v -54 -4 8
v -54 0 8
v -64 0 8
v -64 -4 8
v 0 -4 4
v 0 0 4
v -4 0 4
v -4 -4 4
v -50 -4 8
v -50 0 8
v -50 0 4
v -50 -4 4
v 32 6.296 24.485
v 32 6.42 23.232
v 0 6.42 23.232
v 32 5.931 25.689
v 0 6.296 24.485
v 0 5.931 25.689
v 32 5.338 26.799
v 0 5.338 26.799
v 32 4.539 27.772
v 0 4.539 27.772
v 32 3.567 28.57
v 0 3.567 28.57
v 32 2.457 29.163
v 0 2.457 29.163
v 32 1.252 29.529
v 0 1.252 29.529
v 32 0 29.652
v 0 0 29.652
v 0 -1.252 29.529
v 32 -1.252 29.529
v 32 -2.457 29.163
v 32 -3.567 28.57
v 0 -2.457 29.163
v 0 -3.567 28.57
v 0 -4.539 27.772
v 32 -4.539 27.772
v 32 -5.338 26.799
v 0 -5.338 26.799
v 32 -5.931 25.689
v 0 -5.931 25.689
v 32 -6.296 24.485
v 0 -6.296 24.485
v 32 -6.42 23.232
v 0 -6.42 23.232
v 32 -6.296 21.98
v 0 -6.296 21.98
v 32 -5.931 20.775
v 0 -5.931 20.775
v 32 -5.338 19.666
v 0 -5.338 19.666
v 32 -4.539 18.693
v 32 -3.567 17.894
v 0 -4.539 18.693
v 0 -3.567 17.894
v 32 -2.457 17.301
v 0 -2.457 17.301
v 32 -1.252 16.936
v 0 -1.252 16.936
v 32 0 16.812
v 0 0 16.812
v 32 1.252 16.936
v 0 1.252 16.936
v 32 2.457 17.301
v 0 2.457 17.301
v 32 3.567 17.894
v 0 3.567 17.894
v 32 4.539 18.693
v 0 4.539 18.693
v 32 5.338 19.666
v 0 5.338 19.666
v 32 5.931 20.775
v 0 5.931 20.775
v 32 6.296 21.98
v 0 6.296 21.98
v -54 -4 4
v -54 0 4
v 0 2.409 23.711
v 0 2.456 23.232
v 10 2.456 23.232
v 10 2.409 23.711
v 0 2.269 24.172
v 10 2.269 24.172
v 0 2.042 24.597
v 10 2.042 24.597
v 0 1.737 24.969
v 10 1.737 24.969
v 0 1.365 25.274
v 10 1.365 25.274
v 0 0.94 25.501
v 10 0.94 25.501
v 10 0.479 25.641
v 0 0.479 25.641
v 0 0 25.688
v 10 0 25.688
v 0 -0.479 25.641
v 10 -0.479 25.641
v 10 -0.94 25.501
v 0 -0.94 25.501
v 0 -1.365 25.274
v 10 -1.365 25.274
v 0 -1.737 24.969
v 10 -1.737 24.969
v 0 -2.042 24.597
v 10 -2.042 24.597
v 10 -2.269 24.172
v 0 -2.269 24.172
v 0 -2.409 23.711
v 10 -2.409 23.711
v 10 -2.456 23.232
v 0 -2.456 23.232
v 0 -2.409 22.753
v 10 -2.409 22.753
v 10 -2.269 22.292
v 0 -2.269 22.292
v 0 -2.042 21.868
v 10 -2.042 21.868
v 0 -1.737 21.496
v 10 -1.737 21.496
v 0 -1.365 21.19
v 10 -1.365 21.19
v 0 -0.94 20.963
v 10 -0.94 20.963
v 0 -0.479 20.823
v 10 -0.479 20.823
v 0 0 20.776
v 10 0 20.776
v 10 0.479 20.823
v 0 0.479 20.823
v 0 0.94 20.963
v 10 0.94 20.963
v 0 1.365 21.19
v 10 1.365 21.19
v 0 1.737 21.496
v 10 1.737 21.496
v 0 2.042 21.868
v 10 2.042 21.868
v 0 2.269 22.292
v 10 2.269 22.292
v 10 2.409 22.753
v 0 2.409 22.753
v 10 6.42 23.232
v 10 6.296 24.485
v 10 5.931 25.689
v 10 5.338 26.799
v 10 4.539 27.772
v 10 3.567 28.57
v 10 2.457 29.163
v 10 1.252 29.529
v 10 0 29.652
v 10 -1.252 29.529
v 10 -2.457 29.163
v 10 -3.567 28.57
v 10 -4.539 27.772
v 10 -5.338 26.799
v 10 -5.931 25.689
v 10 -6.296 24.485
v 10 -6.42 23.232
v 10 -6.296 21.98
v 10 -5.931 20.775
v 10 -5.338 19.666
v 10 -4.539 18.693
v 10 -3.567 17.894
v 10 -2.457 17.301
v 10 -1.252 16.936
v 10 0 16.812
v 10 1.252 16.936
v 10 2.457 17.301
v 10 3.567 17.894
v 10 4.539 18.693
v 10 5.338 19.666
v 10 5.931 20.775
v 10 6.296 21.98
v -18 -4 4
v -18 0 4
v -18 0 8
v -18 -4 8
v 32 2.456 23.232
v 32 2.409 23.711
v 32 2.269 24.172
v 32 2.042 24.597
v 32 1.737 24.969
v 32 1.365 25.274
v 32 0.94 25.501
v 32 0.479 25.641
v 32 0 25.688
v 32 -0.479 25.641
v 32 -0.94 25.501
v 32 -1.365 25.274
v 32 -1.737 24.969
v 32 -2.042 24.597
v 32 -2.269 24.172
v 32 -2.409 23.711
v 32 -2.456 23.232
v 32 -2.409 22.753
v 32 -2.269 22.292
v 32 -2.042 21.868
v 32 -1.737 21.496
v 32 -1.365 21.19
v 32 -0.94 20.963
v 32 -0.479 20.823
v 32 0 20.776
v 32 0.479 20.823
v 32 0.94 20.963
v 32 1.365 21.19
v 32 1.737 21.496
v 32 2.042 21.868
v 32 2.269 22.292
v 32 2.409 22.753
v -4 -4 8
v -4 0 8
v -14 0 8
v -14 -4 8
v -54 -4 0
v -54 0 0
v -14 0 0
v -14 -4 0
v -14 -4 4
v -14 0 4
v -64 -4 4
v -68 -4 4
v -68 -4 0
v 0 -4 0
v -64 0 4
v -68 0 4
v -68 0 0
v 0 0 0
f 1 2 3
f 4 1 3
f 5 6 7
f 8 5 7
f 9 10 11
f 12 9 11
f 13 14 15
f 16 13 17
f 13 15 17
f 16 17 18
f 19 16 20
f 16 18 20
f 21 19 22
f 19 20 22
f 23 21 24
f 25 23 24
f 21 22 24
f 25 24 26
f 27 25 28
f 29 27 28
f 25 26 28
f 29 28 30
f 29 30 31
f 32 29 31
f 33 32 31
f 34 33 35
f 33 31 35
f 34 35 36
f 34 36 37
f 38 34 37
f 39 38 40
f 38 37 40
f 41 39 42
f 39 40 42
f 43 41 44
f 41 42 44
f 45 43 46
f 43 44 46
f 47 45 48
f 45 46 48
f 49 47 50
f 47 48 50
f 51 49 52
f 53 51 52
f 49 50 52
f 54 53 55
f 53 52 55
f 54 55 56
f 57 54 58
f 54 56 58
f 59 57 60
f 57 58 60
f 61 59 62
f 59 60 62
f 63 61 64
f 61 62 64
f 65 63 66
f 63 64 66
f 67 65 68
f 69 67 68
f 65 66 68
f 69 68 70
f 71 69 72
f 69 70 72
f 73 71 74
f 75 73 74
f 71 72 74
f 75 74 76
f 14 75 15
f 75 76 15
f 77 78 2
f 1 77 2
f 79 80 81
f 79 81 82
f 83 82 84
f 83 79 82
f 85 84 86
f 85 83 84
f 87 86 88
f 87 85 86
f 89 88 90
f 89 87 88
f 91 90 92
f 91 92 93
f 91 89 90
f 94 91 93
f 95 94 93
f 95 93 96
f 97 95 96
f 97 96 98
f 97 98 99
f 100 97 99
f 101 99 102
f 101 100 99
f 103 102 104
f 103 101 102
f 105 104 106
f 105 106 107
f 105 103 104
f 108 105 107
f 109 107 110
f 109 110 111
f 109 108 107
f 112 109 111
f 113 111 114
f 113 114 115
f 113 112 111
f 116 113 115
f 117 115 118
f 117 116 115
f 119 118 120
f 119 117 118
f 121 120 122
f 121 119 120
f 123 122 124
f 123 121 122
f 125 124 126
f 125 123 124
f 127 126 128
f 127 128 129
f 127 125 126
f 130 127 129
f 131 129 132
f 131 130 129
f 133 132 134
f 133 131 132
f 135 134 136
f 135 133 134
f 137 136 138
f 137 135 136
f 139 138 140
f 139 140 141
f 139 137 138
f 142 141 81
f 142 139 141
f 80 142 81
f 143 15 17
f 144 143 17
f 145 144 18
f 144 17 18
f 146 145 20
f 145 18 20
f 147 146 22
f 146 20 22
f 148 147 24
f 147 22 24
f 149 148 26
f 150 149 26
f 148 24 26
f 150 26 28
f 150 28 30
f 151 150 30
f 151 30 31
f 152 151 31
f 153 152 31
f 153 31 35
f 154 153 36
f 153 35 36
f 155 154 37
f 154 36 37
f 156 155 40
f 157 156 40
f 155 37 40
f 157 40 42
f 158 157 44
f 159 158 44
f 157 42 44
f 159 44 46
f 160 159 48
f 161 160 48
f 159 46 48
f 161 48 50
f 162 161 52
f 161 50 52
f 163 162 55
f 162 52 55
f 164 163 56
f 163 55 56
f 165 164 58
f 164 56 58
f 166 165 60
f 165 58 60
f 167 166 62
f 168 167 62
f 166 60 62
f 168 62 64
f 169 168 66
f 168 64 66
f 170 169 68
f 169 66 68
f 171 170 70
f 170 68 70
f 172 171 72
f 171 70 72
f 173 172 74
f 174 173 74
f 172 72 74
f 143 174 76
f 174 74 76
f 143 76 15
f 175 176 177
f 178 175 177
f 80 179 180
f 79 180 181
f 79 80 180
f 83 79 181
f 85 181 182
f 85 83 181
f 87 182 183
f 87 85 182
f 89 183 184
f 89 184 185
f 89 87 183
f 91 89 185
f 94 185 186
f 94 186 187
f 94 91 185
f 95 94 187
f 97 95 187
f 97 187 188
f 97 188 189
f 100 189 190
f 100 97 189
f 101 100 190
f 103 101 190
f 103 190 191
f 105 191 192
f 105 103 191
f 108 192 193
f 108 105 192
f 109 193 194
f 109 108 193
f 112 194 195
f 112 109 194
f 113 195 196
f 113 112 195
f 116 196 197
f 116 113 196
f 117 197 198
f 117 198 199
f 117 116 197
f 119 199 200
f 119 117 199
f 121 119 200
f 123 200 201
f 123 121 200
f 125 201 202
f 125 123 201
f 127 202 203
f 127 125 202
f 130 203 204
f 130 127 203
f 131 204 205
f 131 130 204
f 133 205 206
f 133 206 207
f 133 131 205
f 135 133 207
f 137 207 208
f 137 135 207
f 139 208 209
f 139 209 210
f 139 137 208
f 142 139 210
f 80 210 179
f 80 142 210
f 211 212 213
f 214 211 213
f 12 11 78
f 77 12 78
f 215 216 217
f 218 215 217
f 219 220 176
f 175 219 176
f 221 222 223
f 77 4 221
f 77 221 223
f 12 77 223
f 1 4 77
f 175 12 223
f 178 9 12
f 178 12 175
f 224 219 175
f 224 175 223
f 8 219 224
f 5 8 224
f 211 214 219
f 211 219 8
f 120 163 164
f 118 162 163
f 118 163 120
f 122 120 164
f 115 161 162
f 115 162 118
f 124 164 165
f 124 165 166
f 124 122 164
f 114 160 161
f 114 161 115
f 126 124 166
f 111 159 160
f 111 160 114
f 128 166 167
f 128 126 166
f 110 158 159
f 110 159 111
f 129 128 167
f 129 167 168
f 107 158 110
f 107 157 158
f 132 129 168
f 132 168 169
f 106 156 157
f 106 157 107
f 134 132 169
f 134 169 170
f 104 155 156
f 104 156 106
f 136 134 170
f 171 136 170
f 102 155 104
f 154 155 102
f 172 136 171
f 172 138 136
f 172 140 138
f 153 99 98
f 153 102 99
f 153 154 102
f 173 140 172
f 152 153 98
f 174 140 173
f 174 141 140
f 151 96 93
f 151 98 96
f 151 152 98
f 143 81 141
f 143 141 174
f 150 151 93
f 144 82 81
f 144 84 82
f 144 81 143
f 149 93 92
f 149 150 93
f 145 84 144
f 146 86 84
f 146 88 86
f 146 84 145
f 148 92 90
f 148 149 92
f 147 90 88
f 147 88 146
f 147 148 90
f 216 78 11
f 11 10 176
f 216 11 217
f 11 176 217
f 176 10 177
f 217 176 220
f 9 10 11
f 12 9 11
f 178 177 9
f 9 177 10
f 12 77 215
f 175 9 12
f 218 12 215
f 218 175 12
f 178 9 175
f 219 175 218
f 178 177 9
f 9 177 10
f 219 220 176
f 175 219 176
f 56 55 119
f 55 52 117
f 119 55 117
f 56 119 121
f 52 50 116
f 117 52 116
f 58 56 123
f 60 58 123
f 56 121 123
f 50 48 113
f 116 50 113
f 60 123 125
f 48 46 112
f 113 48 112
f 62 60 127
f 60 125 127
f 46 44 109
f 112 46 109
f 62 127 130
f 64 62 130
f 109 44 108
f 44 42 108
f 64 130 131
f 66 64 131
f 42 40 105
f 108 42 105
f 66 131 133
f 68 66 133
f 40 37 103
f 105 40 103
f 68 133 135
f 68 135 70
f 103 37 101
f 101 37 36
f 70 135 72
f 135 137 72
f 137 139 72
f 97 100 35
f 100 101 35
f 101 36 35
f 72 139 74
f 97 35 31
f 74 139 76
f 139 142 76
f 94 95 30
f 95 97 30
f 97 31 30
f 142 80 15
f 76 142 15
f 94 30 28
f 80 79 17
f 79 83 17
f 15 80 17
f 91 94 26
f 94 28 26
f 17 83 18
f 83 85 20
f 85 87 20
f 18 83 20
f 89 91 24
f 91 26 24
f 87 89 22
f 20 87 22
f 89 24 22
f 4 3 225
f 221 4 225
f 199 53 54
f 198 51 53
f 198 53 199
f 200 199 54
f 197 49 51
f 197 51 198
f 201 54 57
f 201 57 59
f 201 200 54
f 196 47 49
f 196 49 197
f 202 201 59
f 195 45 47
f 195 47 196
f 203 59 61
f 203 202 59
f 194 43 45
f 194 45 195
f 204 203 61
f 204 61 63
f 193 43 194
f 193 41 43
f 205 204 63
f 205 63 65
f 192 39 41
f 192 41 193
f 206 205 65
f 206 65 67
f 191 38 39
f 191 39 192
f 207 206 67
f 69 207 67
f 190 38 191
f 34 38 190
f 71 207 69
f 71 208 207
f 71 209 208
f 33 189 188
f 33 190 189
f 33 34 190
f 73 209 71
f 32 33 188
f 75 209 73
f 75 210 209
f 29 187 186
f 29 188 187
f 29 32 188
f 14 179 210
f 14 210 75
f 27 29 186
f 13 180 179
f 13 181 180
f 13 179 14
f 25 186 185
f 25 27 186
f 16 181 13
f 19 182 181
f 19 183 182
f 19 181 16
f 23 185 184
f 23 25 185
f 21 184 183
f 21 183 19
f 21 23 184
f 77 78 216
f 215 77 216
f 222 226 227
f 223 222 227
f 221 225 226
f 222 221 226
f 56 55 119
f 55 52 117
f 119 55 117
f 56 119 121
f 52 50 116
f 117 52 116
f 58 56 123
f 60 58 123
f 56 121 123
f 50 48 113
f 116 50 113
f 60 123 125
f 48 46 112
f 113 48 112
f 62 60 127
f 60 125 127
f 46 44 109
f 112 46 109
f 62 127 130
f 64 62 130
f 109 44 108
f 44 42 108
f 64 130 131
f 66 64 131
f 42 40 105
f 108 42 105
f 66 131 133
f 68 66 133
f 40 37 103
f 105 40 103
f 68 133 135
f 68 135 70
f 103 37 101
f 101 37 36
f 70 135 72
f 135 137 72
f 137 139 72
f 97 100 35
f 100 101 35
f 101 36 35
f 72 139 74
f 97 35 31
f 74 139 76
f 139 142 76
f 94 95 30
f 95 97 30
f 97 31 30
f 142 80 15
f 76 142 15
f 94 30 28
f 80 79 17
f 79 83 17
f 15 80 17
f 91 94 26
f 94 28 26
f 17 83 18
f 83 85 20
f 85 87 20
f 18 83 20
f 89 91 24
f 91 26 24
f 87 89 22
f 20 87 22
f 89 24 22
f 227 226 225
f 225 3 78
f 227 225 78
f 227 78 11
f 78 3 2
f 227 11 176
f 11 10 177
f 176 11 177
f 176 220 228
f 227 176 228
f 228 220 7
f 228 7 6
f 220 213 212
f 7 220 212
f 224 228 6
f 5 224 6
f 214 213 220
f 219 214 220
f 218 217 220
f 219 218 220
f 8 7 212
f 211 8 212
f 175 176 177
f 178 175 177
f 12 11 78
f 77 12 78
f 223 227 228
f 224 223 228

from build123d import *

# Parameters (mm, degrees)
F1_DEPTH = 4
F2_DEPTH = 4
F3_R     = 6.419793
F3_R_2   = 2.456127
F4_DEPTH = 32
F5_DEPTH = 10


with BuildPart() as f1:
    # F0 (on Front) → F1 (new body)
    with BuildSketch(Plane.XZ):
        Polygon((-14, 0), (0, 0), (0, 4), (-4, 4), (-4, 8), (-14, 8), (-14, 4), align=None)
        Polygon((-54, 0), (-14, 0), (-14, 4), (-18, 4), (-18, 8), (-50, 8), (-50, 4), (-54, 4), align=None)
        Polygon((-68, 0), (-54, 0), (-54, 4), (-54, 8), (-64, 8), (-64, 4), (-68, 4), align=None)
    extrude(amount=F1_DEPTH)


with BuildPart() as f2:
    # F0 (on Front) → F2 (new body)
    with BuildSketch(Plane.XZ):
        Polygon((-54, 0), (-14, 0), (-14, 4), (-18, 4), (-18, 8), (-50, 8), (-50, 4), (-54, 4), align=None)
    extrude(amount=F2_DEPTH)


with BuildPart() as f4:
    # F3 (on Right) → F4 (new body)
    with BuildSketch(Plane.YZ):
        with Locations((0, 23.232248)):
            Circle(F3_R)
        with Locations((0, 23.232248)):
            Circle(F3_R_2, mode=Mode.SUBTRACT)
    extrude(amount=F4_DEPTH)


with BuildPart() as f5:
    # F3 (on Right) → F5 (new body)
    with BuildSketch(Plane.YZ):
        with Locations((0, 23.232248)):
            Circle(F3_R)
        with Locations((0, 23.232248)):
            Circle(F3_R_2, mode=Mode.SUBTRACT)
    extrude(amount=F5_DEPTH)


solid = Compound([f1.part, f2.part, f4.part, f5.part])
